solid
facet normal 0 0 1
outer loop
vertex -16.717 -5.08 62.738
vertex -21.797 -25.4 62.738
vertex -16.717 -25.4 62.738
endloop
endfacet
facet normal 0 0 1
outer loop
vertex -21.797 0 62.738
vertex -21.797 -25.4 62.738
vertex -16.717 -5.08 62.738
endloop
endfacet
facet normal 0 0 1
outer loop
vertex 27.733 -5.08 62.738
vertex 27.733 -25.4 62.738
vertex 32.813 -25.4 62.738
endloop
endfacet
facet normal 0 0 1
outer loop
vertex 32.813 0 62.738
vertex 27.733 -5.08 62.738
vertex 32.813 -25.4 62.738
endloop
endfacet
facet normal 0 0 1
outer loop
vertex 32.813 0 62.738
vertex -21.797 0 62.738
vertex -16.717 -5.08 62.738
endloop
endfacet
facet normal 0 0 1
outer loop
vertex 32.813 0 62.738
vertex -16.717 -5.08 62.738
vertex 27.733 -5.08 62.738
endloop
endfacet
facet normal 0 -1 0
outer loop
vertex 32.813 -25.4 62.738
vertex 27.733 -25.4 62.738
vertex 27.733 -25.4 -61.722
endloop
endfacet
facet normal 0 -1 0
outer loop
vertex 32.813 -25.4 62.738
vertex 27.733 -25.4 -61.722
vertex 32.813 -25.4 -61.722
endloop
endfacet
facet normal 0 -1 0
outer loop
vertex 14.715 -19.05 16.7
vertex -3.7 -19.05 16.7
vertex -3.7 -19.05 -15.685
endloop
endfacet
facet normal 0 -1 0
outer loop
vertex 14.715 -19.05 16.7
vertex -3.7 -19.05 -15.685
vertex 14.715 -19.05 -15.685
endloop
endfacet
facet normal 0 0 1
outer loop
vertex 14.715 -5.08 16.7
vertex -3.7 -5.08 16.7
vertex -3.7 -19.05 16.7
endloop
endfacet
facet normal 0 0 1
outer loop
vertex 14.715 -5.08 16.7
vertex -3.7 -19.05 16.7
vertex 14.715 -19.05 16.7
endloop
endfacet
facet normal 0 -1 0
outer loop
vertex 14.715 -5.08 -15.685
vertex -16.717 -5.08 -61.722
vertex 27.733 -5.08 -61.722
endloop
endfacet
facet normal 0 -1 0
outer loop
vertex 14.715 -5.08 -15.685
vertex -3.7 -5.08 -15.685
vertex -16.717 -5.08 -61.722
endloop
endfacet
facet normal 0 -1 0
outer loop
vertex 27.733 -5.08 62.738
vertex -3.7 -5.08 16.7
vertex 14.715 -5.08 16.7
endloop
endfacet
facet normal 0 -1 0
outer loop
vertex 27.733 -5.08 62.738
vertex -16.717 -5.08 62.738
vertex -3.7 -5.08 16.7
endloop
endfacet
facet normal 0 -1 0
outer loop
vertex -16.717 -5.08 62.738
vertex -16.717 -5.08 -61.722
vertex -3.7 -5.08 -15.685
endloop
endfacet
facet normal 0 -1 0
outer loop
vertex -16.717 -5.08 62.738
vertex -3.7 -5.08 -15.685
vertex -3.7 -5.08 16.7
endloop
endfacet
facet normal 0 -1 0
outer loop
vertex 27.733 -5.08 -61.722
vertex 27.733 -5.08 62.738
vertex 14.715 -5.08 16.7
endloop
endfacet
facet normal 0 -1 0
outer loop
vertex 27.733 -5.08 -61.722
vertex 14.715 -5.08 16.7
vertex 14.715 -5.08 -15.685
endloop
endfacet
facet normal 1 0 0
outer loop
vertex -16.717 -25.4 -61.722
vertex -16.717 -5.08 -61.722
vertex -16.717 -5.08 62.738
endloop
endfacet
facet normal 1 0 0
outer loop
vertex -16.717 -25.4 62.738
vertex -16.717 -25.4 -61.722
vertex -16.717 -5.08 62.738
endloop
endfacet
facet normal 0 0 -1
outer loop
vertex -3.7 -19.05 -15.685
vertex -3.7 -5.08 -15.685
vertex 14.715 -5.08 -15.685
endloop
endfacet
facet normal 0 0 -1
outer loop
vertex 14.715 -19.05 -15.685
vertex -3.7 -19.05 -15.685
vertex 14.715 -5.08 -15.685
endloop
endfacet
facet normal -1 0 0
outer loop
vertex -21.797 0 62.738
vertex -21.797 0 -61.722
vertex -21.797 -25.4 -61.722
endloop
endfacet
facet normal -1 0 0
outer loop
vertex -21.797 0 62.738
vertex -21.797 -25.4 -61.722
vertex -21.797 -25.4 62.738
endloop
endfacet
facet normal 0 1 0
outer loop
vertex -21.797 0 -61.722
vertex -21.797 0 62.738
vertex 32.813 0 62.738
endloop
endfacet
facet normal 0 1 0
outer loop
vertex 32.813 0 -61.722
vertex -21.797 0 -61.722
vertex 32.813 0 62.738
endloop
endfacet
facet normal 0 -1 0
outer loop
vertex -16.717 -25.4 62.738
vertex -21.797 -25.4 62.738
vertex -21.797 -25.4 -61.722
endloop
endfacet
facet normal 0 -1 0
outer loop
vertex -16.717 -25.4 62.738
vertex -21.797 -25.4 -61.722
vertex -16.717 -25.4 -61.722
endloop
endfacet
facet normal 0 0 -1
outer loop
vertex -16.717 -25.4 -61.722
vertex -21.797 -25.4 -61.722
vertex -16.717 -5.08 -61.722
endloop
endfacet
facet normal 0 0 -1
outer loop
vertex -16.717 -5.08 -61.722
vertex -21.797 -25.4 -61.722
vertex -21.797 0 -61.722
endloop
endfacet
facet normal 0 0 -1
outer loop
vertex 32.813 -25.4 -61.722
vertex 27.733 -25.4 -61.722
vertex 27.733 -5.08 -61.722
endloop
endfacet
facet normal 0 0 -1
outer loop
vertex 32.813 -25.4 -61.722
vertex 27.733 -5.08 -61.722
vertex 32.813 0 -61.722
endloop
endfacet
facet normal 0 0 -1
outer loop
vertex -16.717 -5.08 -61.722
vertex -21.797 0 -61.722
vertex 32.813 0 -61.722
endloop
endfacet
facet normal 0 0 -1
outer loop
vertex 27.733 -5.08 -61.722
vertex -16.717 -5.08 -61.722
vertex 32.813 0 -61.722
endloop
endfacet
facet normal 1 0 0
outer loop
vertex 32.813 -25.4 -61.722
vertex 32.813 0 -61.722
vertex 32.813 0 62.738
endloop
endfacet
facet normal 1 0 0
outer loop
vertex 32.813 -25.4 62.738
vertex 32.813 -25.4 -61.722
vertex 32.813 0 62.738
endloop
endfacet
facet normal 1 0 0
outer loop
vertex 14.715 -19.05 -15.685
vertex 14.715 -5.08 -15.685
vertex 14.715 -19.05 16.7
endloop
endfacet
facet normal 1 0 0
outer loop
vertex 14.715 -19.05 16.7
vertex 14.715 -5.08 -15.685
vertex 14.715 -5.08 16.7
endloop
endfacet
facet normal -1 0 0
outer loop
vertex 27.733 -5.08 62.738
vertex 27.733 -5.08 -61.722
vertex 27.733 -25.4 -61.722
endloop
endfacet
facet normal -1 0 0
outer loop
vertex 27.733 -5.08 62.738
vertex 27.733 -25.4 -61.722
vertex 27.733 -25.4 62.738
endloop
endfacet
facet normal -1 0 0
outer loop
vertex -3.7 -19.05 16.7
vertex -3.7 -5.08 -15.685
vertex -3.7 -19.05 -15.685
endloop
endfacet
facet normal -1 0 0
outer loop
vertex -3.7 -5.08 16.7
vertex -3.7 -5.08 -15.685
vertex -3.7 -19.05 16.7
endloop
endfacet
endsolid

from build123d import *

# Parameters (mm, degrees)
F0_W     = 44.45
F0_H     = 124.46
F0_W_2   = 18.415
F0_H_2   = 32.385
F1_DEPTH = 5.08
F0_W_3   = 5.08
F2_DEPTH = 25.4
F3_DEPTH = 19.05


with BuildPart() as f1:
    # F0 (on Front) → F1 (new body)
    with BuildSketch(Plane.XZ):
        with Locations((5.507742, 0.507997)):
            Rectangle(F0_W, F0_H)
        with Locations((5.507742, 0.507997)):
            Rectangle(F0_W_2, F0_H_2, mode=Mode.SUBTRACT)
    extrude(amount=F1_DEPTH)

    # F0 (on Front) → F2 (join)
    with BuildSketch(Plane.XZ):
        with Locations((30.272742, 0.507997)):
            Rectangle(F0_W_3, F0_H)
        with Locations((-19.257258, 0.507997)):
            Rectangle(F0_W_3, F0_H)
    extrude(amount=F2_DEPTH)

    # F0 (on Front) → F3 (join)
    with BuildSketch(Plane.XZ):
        with Locations((5.507742, 0.507997)):
            Rectangle(F0_W_2, F0_H_2)
    extrude(amount=F3_DEPTH)


solid = f1.part
